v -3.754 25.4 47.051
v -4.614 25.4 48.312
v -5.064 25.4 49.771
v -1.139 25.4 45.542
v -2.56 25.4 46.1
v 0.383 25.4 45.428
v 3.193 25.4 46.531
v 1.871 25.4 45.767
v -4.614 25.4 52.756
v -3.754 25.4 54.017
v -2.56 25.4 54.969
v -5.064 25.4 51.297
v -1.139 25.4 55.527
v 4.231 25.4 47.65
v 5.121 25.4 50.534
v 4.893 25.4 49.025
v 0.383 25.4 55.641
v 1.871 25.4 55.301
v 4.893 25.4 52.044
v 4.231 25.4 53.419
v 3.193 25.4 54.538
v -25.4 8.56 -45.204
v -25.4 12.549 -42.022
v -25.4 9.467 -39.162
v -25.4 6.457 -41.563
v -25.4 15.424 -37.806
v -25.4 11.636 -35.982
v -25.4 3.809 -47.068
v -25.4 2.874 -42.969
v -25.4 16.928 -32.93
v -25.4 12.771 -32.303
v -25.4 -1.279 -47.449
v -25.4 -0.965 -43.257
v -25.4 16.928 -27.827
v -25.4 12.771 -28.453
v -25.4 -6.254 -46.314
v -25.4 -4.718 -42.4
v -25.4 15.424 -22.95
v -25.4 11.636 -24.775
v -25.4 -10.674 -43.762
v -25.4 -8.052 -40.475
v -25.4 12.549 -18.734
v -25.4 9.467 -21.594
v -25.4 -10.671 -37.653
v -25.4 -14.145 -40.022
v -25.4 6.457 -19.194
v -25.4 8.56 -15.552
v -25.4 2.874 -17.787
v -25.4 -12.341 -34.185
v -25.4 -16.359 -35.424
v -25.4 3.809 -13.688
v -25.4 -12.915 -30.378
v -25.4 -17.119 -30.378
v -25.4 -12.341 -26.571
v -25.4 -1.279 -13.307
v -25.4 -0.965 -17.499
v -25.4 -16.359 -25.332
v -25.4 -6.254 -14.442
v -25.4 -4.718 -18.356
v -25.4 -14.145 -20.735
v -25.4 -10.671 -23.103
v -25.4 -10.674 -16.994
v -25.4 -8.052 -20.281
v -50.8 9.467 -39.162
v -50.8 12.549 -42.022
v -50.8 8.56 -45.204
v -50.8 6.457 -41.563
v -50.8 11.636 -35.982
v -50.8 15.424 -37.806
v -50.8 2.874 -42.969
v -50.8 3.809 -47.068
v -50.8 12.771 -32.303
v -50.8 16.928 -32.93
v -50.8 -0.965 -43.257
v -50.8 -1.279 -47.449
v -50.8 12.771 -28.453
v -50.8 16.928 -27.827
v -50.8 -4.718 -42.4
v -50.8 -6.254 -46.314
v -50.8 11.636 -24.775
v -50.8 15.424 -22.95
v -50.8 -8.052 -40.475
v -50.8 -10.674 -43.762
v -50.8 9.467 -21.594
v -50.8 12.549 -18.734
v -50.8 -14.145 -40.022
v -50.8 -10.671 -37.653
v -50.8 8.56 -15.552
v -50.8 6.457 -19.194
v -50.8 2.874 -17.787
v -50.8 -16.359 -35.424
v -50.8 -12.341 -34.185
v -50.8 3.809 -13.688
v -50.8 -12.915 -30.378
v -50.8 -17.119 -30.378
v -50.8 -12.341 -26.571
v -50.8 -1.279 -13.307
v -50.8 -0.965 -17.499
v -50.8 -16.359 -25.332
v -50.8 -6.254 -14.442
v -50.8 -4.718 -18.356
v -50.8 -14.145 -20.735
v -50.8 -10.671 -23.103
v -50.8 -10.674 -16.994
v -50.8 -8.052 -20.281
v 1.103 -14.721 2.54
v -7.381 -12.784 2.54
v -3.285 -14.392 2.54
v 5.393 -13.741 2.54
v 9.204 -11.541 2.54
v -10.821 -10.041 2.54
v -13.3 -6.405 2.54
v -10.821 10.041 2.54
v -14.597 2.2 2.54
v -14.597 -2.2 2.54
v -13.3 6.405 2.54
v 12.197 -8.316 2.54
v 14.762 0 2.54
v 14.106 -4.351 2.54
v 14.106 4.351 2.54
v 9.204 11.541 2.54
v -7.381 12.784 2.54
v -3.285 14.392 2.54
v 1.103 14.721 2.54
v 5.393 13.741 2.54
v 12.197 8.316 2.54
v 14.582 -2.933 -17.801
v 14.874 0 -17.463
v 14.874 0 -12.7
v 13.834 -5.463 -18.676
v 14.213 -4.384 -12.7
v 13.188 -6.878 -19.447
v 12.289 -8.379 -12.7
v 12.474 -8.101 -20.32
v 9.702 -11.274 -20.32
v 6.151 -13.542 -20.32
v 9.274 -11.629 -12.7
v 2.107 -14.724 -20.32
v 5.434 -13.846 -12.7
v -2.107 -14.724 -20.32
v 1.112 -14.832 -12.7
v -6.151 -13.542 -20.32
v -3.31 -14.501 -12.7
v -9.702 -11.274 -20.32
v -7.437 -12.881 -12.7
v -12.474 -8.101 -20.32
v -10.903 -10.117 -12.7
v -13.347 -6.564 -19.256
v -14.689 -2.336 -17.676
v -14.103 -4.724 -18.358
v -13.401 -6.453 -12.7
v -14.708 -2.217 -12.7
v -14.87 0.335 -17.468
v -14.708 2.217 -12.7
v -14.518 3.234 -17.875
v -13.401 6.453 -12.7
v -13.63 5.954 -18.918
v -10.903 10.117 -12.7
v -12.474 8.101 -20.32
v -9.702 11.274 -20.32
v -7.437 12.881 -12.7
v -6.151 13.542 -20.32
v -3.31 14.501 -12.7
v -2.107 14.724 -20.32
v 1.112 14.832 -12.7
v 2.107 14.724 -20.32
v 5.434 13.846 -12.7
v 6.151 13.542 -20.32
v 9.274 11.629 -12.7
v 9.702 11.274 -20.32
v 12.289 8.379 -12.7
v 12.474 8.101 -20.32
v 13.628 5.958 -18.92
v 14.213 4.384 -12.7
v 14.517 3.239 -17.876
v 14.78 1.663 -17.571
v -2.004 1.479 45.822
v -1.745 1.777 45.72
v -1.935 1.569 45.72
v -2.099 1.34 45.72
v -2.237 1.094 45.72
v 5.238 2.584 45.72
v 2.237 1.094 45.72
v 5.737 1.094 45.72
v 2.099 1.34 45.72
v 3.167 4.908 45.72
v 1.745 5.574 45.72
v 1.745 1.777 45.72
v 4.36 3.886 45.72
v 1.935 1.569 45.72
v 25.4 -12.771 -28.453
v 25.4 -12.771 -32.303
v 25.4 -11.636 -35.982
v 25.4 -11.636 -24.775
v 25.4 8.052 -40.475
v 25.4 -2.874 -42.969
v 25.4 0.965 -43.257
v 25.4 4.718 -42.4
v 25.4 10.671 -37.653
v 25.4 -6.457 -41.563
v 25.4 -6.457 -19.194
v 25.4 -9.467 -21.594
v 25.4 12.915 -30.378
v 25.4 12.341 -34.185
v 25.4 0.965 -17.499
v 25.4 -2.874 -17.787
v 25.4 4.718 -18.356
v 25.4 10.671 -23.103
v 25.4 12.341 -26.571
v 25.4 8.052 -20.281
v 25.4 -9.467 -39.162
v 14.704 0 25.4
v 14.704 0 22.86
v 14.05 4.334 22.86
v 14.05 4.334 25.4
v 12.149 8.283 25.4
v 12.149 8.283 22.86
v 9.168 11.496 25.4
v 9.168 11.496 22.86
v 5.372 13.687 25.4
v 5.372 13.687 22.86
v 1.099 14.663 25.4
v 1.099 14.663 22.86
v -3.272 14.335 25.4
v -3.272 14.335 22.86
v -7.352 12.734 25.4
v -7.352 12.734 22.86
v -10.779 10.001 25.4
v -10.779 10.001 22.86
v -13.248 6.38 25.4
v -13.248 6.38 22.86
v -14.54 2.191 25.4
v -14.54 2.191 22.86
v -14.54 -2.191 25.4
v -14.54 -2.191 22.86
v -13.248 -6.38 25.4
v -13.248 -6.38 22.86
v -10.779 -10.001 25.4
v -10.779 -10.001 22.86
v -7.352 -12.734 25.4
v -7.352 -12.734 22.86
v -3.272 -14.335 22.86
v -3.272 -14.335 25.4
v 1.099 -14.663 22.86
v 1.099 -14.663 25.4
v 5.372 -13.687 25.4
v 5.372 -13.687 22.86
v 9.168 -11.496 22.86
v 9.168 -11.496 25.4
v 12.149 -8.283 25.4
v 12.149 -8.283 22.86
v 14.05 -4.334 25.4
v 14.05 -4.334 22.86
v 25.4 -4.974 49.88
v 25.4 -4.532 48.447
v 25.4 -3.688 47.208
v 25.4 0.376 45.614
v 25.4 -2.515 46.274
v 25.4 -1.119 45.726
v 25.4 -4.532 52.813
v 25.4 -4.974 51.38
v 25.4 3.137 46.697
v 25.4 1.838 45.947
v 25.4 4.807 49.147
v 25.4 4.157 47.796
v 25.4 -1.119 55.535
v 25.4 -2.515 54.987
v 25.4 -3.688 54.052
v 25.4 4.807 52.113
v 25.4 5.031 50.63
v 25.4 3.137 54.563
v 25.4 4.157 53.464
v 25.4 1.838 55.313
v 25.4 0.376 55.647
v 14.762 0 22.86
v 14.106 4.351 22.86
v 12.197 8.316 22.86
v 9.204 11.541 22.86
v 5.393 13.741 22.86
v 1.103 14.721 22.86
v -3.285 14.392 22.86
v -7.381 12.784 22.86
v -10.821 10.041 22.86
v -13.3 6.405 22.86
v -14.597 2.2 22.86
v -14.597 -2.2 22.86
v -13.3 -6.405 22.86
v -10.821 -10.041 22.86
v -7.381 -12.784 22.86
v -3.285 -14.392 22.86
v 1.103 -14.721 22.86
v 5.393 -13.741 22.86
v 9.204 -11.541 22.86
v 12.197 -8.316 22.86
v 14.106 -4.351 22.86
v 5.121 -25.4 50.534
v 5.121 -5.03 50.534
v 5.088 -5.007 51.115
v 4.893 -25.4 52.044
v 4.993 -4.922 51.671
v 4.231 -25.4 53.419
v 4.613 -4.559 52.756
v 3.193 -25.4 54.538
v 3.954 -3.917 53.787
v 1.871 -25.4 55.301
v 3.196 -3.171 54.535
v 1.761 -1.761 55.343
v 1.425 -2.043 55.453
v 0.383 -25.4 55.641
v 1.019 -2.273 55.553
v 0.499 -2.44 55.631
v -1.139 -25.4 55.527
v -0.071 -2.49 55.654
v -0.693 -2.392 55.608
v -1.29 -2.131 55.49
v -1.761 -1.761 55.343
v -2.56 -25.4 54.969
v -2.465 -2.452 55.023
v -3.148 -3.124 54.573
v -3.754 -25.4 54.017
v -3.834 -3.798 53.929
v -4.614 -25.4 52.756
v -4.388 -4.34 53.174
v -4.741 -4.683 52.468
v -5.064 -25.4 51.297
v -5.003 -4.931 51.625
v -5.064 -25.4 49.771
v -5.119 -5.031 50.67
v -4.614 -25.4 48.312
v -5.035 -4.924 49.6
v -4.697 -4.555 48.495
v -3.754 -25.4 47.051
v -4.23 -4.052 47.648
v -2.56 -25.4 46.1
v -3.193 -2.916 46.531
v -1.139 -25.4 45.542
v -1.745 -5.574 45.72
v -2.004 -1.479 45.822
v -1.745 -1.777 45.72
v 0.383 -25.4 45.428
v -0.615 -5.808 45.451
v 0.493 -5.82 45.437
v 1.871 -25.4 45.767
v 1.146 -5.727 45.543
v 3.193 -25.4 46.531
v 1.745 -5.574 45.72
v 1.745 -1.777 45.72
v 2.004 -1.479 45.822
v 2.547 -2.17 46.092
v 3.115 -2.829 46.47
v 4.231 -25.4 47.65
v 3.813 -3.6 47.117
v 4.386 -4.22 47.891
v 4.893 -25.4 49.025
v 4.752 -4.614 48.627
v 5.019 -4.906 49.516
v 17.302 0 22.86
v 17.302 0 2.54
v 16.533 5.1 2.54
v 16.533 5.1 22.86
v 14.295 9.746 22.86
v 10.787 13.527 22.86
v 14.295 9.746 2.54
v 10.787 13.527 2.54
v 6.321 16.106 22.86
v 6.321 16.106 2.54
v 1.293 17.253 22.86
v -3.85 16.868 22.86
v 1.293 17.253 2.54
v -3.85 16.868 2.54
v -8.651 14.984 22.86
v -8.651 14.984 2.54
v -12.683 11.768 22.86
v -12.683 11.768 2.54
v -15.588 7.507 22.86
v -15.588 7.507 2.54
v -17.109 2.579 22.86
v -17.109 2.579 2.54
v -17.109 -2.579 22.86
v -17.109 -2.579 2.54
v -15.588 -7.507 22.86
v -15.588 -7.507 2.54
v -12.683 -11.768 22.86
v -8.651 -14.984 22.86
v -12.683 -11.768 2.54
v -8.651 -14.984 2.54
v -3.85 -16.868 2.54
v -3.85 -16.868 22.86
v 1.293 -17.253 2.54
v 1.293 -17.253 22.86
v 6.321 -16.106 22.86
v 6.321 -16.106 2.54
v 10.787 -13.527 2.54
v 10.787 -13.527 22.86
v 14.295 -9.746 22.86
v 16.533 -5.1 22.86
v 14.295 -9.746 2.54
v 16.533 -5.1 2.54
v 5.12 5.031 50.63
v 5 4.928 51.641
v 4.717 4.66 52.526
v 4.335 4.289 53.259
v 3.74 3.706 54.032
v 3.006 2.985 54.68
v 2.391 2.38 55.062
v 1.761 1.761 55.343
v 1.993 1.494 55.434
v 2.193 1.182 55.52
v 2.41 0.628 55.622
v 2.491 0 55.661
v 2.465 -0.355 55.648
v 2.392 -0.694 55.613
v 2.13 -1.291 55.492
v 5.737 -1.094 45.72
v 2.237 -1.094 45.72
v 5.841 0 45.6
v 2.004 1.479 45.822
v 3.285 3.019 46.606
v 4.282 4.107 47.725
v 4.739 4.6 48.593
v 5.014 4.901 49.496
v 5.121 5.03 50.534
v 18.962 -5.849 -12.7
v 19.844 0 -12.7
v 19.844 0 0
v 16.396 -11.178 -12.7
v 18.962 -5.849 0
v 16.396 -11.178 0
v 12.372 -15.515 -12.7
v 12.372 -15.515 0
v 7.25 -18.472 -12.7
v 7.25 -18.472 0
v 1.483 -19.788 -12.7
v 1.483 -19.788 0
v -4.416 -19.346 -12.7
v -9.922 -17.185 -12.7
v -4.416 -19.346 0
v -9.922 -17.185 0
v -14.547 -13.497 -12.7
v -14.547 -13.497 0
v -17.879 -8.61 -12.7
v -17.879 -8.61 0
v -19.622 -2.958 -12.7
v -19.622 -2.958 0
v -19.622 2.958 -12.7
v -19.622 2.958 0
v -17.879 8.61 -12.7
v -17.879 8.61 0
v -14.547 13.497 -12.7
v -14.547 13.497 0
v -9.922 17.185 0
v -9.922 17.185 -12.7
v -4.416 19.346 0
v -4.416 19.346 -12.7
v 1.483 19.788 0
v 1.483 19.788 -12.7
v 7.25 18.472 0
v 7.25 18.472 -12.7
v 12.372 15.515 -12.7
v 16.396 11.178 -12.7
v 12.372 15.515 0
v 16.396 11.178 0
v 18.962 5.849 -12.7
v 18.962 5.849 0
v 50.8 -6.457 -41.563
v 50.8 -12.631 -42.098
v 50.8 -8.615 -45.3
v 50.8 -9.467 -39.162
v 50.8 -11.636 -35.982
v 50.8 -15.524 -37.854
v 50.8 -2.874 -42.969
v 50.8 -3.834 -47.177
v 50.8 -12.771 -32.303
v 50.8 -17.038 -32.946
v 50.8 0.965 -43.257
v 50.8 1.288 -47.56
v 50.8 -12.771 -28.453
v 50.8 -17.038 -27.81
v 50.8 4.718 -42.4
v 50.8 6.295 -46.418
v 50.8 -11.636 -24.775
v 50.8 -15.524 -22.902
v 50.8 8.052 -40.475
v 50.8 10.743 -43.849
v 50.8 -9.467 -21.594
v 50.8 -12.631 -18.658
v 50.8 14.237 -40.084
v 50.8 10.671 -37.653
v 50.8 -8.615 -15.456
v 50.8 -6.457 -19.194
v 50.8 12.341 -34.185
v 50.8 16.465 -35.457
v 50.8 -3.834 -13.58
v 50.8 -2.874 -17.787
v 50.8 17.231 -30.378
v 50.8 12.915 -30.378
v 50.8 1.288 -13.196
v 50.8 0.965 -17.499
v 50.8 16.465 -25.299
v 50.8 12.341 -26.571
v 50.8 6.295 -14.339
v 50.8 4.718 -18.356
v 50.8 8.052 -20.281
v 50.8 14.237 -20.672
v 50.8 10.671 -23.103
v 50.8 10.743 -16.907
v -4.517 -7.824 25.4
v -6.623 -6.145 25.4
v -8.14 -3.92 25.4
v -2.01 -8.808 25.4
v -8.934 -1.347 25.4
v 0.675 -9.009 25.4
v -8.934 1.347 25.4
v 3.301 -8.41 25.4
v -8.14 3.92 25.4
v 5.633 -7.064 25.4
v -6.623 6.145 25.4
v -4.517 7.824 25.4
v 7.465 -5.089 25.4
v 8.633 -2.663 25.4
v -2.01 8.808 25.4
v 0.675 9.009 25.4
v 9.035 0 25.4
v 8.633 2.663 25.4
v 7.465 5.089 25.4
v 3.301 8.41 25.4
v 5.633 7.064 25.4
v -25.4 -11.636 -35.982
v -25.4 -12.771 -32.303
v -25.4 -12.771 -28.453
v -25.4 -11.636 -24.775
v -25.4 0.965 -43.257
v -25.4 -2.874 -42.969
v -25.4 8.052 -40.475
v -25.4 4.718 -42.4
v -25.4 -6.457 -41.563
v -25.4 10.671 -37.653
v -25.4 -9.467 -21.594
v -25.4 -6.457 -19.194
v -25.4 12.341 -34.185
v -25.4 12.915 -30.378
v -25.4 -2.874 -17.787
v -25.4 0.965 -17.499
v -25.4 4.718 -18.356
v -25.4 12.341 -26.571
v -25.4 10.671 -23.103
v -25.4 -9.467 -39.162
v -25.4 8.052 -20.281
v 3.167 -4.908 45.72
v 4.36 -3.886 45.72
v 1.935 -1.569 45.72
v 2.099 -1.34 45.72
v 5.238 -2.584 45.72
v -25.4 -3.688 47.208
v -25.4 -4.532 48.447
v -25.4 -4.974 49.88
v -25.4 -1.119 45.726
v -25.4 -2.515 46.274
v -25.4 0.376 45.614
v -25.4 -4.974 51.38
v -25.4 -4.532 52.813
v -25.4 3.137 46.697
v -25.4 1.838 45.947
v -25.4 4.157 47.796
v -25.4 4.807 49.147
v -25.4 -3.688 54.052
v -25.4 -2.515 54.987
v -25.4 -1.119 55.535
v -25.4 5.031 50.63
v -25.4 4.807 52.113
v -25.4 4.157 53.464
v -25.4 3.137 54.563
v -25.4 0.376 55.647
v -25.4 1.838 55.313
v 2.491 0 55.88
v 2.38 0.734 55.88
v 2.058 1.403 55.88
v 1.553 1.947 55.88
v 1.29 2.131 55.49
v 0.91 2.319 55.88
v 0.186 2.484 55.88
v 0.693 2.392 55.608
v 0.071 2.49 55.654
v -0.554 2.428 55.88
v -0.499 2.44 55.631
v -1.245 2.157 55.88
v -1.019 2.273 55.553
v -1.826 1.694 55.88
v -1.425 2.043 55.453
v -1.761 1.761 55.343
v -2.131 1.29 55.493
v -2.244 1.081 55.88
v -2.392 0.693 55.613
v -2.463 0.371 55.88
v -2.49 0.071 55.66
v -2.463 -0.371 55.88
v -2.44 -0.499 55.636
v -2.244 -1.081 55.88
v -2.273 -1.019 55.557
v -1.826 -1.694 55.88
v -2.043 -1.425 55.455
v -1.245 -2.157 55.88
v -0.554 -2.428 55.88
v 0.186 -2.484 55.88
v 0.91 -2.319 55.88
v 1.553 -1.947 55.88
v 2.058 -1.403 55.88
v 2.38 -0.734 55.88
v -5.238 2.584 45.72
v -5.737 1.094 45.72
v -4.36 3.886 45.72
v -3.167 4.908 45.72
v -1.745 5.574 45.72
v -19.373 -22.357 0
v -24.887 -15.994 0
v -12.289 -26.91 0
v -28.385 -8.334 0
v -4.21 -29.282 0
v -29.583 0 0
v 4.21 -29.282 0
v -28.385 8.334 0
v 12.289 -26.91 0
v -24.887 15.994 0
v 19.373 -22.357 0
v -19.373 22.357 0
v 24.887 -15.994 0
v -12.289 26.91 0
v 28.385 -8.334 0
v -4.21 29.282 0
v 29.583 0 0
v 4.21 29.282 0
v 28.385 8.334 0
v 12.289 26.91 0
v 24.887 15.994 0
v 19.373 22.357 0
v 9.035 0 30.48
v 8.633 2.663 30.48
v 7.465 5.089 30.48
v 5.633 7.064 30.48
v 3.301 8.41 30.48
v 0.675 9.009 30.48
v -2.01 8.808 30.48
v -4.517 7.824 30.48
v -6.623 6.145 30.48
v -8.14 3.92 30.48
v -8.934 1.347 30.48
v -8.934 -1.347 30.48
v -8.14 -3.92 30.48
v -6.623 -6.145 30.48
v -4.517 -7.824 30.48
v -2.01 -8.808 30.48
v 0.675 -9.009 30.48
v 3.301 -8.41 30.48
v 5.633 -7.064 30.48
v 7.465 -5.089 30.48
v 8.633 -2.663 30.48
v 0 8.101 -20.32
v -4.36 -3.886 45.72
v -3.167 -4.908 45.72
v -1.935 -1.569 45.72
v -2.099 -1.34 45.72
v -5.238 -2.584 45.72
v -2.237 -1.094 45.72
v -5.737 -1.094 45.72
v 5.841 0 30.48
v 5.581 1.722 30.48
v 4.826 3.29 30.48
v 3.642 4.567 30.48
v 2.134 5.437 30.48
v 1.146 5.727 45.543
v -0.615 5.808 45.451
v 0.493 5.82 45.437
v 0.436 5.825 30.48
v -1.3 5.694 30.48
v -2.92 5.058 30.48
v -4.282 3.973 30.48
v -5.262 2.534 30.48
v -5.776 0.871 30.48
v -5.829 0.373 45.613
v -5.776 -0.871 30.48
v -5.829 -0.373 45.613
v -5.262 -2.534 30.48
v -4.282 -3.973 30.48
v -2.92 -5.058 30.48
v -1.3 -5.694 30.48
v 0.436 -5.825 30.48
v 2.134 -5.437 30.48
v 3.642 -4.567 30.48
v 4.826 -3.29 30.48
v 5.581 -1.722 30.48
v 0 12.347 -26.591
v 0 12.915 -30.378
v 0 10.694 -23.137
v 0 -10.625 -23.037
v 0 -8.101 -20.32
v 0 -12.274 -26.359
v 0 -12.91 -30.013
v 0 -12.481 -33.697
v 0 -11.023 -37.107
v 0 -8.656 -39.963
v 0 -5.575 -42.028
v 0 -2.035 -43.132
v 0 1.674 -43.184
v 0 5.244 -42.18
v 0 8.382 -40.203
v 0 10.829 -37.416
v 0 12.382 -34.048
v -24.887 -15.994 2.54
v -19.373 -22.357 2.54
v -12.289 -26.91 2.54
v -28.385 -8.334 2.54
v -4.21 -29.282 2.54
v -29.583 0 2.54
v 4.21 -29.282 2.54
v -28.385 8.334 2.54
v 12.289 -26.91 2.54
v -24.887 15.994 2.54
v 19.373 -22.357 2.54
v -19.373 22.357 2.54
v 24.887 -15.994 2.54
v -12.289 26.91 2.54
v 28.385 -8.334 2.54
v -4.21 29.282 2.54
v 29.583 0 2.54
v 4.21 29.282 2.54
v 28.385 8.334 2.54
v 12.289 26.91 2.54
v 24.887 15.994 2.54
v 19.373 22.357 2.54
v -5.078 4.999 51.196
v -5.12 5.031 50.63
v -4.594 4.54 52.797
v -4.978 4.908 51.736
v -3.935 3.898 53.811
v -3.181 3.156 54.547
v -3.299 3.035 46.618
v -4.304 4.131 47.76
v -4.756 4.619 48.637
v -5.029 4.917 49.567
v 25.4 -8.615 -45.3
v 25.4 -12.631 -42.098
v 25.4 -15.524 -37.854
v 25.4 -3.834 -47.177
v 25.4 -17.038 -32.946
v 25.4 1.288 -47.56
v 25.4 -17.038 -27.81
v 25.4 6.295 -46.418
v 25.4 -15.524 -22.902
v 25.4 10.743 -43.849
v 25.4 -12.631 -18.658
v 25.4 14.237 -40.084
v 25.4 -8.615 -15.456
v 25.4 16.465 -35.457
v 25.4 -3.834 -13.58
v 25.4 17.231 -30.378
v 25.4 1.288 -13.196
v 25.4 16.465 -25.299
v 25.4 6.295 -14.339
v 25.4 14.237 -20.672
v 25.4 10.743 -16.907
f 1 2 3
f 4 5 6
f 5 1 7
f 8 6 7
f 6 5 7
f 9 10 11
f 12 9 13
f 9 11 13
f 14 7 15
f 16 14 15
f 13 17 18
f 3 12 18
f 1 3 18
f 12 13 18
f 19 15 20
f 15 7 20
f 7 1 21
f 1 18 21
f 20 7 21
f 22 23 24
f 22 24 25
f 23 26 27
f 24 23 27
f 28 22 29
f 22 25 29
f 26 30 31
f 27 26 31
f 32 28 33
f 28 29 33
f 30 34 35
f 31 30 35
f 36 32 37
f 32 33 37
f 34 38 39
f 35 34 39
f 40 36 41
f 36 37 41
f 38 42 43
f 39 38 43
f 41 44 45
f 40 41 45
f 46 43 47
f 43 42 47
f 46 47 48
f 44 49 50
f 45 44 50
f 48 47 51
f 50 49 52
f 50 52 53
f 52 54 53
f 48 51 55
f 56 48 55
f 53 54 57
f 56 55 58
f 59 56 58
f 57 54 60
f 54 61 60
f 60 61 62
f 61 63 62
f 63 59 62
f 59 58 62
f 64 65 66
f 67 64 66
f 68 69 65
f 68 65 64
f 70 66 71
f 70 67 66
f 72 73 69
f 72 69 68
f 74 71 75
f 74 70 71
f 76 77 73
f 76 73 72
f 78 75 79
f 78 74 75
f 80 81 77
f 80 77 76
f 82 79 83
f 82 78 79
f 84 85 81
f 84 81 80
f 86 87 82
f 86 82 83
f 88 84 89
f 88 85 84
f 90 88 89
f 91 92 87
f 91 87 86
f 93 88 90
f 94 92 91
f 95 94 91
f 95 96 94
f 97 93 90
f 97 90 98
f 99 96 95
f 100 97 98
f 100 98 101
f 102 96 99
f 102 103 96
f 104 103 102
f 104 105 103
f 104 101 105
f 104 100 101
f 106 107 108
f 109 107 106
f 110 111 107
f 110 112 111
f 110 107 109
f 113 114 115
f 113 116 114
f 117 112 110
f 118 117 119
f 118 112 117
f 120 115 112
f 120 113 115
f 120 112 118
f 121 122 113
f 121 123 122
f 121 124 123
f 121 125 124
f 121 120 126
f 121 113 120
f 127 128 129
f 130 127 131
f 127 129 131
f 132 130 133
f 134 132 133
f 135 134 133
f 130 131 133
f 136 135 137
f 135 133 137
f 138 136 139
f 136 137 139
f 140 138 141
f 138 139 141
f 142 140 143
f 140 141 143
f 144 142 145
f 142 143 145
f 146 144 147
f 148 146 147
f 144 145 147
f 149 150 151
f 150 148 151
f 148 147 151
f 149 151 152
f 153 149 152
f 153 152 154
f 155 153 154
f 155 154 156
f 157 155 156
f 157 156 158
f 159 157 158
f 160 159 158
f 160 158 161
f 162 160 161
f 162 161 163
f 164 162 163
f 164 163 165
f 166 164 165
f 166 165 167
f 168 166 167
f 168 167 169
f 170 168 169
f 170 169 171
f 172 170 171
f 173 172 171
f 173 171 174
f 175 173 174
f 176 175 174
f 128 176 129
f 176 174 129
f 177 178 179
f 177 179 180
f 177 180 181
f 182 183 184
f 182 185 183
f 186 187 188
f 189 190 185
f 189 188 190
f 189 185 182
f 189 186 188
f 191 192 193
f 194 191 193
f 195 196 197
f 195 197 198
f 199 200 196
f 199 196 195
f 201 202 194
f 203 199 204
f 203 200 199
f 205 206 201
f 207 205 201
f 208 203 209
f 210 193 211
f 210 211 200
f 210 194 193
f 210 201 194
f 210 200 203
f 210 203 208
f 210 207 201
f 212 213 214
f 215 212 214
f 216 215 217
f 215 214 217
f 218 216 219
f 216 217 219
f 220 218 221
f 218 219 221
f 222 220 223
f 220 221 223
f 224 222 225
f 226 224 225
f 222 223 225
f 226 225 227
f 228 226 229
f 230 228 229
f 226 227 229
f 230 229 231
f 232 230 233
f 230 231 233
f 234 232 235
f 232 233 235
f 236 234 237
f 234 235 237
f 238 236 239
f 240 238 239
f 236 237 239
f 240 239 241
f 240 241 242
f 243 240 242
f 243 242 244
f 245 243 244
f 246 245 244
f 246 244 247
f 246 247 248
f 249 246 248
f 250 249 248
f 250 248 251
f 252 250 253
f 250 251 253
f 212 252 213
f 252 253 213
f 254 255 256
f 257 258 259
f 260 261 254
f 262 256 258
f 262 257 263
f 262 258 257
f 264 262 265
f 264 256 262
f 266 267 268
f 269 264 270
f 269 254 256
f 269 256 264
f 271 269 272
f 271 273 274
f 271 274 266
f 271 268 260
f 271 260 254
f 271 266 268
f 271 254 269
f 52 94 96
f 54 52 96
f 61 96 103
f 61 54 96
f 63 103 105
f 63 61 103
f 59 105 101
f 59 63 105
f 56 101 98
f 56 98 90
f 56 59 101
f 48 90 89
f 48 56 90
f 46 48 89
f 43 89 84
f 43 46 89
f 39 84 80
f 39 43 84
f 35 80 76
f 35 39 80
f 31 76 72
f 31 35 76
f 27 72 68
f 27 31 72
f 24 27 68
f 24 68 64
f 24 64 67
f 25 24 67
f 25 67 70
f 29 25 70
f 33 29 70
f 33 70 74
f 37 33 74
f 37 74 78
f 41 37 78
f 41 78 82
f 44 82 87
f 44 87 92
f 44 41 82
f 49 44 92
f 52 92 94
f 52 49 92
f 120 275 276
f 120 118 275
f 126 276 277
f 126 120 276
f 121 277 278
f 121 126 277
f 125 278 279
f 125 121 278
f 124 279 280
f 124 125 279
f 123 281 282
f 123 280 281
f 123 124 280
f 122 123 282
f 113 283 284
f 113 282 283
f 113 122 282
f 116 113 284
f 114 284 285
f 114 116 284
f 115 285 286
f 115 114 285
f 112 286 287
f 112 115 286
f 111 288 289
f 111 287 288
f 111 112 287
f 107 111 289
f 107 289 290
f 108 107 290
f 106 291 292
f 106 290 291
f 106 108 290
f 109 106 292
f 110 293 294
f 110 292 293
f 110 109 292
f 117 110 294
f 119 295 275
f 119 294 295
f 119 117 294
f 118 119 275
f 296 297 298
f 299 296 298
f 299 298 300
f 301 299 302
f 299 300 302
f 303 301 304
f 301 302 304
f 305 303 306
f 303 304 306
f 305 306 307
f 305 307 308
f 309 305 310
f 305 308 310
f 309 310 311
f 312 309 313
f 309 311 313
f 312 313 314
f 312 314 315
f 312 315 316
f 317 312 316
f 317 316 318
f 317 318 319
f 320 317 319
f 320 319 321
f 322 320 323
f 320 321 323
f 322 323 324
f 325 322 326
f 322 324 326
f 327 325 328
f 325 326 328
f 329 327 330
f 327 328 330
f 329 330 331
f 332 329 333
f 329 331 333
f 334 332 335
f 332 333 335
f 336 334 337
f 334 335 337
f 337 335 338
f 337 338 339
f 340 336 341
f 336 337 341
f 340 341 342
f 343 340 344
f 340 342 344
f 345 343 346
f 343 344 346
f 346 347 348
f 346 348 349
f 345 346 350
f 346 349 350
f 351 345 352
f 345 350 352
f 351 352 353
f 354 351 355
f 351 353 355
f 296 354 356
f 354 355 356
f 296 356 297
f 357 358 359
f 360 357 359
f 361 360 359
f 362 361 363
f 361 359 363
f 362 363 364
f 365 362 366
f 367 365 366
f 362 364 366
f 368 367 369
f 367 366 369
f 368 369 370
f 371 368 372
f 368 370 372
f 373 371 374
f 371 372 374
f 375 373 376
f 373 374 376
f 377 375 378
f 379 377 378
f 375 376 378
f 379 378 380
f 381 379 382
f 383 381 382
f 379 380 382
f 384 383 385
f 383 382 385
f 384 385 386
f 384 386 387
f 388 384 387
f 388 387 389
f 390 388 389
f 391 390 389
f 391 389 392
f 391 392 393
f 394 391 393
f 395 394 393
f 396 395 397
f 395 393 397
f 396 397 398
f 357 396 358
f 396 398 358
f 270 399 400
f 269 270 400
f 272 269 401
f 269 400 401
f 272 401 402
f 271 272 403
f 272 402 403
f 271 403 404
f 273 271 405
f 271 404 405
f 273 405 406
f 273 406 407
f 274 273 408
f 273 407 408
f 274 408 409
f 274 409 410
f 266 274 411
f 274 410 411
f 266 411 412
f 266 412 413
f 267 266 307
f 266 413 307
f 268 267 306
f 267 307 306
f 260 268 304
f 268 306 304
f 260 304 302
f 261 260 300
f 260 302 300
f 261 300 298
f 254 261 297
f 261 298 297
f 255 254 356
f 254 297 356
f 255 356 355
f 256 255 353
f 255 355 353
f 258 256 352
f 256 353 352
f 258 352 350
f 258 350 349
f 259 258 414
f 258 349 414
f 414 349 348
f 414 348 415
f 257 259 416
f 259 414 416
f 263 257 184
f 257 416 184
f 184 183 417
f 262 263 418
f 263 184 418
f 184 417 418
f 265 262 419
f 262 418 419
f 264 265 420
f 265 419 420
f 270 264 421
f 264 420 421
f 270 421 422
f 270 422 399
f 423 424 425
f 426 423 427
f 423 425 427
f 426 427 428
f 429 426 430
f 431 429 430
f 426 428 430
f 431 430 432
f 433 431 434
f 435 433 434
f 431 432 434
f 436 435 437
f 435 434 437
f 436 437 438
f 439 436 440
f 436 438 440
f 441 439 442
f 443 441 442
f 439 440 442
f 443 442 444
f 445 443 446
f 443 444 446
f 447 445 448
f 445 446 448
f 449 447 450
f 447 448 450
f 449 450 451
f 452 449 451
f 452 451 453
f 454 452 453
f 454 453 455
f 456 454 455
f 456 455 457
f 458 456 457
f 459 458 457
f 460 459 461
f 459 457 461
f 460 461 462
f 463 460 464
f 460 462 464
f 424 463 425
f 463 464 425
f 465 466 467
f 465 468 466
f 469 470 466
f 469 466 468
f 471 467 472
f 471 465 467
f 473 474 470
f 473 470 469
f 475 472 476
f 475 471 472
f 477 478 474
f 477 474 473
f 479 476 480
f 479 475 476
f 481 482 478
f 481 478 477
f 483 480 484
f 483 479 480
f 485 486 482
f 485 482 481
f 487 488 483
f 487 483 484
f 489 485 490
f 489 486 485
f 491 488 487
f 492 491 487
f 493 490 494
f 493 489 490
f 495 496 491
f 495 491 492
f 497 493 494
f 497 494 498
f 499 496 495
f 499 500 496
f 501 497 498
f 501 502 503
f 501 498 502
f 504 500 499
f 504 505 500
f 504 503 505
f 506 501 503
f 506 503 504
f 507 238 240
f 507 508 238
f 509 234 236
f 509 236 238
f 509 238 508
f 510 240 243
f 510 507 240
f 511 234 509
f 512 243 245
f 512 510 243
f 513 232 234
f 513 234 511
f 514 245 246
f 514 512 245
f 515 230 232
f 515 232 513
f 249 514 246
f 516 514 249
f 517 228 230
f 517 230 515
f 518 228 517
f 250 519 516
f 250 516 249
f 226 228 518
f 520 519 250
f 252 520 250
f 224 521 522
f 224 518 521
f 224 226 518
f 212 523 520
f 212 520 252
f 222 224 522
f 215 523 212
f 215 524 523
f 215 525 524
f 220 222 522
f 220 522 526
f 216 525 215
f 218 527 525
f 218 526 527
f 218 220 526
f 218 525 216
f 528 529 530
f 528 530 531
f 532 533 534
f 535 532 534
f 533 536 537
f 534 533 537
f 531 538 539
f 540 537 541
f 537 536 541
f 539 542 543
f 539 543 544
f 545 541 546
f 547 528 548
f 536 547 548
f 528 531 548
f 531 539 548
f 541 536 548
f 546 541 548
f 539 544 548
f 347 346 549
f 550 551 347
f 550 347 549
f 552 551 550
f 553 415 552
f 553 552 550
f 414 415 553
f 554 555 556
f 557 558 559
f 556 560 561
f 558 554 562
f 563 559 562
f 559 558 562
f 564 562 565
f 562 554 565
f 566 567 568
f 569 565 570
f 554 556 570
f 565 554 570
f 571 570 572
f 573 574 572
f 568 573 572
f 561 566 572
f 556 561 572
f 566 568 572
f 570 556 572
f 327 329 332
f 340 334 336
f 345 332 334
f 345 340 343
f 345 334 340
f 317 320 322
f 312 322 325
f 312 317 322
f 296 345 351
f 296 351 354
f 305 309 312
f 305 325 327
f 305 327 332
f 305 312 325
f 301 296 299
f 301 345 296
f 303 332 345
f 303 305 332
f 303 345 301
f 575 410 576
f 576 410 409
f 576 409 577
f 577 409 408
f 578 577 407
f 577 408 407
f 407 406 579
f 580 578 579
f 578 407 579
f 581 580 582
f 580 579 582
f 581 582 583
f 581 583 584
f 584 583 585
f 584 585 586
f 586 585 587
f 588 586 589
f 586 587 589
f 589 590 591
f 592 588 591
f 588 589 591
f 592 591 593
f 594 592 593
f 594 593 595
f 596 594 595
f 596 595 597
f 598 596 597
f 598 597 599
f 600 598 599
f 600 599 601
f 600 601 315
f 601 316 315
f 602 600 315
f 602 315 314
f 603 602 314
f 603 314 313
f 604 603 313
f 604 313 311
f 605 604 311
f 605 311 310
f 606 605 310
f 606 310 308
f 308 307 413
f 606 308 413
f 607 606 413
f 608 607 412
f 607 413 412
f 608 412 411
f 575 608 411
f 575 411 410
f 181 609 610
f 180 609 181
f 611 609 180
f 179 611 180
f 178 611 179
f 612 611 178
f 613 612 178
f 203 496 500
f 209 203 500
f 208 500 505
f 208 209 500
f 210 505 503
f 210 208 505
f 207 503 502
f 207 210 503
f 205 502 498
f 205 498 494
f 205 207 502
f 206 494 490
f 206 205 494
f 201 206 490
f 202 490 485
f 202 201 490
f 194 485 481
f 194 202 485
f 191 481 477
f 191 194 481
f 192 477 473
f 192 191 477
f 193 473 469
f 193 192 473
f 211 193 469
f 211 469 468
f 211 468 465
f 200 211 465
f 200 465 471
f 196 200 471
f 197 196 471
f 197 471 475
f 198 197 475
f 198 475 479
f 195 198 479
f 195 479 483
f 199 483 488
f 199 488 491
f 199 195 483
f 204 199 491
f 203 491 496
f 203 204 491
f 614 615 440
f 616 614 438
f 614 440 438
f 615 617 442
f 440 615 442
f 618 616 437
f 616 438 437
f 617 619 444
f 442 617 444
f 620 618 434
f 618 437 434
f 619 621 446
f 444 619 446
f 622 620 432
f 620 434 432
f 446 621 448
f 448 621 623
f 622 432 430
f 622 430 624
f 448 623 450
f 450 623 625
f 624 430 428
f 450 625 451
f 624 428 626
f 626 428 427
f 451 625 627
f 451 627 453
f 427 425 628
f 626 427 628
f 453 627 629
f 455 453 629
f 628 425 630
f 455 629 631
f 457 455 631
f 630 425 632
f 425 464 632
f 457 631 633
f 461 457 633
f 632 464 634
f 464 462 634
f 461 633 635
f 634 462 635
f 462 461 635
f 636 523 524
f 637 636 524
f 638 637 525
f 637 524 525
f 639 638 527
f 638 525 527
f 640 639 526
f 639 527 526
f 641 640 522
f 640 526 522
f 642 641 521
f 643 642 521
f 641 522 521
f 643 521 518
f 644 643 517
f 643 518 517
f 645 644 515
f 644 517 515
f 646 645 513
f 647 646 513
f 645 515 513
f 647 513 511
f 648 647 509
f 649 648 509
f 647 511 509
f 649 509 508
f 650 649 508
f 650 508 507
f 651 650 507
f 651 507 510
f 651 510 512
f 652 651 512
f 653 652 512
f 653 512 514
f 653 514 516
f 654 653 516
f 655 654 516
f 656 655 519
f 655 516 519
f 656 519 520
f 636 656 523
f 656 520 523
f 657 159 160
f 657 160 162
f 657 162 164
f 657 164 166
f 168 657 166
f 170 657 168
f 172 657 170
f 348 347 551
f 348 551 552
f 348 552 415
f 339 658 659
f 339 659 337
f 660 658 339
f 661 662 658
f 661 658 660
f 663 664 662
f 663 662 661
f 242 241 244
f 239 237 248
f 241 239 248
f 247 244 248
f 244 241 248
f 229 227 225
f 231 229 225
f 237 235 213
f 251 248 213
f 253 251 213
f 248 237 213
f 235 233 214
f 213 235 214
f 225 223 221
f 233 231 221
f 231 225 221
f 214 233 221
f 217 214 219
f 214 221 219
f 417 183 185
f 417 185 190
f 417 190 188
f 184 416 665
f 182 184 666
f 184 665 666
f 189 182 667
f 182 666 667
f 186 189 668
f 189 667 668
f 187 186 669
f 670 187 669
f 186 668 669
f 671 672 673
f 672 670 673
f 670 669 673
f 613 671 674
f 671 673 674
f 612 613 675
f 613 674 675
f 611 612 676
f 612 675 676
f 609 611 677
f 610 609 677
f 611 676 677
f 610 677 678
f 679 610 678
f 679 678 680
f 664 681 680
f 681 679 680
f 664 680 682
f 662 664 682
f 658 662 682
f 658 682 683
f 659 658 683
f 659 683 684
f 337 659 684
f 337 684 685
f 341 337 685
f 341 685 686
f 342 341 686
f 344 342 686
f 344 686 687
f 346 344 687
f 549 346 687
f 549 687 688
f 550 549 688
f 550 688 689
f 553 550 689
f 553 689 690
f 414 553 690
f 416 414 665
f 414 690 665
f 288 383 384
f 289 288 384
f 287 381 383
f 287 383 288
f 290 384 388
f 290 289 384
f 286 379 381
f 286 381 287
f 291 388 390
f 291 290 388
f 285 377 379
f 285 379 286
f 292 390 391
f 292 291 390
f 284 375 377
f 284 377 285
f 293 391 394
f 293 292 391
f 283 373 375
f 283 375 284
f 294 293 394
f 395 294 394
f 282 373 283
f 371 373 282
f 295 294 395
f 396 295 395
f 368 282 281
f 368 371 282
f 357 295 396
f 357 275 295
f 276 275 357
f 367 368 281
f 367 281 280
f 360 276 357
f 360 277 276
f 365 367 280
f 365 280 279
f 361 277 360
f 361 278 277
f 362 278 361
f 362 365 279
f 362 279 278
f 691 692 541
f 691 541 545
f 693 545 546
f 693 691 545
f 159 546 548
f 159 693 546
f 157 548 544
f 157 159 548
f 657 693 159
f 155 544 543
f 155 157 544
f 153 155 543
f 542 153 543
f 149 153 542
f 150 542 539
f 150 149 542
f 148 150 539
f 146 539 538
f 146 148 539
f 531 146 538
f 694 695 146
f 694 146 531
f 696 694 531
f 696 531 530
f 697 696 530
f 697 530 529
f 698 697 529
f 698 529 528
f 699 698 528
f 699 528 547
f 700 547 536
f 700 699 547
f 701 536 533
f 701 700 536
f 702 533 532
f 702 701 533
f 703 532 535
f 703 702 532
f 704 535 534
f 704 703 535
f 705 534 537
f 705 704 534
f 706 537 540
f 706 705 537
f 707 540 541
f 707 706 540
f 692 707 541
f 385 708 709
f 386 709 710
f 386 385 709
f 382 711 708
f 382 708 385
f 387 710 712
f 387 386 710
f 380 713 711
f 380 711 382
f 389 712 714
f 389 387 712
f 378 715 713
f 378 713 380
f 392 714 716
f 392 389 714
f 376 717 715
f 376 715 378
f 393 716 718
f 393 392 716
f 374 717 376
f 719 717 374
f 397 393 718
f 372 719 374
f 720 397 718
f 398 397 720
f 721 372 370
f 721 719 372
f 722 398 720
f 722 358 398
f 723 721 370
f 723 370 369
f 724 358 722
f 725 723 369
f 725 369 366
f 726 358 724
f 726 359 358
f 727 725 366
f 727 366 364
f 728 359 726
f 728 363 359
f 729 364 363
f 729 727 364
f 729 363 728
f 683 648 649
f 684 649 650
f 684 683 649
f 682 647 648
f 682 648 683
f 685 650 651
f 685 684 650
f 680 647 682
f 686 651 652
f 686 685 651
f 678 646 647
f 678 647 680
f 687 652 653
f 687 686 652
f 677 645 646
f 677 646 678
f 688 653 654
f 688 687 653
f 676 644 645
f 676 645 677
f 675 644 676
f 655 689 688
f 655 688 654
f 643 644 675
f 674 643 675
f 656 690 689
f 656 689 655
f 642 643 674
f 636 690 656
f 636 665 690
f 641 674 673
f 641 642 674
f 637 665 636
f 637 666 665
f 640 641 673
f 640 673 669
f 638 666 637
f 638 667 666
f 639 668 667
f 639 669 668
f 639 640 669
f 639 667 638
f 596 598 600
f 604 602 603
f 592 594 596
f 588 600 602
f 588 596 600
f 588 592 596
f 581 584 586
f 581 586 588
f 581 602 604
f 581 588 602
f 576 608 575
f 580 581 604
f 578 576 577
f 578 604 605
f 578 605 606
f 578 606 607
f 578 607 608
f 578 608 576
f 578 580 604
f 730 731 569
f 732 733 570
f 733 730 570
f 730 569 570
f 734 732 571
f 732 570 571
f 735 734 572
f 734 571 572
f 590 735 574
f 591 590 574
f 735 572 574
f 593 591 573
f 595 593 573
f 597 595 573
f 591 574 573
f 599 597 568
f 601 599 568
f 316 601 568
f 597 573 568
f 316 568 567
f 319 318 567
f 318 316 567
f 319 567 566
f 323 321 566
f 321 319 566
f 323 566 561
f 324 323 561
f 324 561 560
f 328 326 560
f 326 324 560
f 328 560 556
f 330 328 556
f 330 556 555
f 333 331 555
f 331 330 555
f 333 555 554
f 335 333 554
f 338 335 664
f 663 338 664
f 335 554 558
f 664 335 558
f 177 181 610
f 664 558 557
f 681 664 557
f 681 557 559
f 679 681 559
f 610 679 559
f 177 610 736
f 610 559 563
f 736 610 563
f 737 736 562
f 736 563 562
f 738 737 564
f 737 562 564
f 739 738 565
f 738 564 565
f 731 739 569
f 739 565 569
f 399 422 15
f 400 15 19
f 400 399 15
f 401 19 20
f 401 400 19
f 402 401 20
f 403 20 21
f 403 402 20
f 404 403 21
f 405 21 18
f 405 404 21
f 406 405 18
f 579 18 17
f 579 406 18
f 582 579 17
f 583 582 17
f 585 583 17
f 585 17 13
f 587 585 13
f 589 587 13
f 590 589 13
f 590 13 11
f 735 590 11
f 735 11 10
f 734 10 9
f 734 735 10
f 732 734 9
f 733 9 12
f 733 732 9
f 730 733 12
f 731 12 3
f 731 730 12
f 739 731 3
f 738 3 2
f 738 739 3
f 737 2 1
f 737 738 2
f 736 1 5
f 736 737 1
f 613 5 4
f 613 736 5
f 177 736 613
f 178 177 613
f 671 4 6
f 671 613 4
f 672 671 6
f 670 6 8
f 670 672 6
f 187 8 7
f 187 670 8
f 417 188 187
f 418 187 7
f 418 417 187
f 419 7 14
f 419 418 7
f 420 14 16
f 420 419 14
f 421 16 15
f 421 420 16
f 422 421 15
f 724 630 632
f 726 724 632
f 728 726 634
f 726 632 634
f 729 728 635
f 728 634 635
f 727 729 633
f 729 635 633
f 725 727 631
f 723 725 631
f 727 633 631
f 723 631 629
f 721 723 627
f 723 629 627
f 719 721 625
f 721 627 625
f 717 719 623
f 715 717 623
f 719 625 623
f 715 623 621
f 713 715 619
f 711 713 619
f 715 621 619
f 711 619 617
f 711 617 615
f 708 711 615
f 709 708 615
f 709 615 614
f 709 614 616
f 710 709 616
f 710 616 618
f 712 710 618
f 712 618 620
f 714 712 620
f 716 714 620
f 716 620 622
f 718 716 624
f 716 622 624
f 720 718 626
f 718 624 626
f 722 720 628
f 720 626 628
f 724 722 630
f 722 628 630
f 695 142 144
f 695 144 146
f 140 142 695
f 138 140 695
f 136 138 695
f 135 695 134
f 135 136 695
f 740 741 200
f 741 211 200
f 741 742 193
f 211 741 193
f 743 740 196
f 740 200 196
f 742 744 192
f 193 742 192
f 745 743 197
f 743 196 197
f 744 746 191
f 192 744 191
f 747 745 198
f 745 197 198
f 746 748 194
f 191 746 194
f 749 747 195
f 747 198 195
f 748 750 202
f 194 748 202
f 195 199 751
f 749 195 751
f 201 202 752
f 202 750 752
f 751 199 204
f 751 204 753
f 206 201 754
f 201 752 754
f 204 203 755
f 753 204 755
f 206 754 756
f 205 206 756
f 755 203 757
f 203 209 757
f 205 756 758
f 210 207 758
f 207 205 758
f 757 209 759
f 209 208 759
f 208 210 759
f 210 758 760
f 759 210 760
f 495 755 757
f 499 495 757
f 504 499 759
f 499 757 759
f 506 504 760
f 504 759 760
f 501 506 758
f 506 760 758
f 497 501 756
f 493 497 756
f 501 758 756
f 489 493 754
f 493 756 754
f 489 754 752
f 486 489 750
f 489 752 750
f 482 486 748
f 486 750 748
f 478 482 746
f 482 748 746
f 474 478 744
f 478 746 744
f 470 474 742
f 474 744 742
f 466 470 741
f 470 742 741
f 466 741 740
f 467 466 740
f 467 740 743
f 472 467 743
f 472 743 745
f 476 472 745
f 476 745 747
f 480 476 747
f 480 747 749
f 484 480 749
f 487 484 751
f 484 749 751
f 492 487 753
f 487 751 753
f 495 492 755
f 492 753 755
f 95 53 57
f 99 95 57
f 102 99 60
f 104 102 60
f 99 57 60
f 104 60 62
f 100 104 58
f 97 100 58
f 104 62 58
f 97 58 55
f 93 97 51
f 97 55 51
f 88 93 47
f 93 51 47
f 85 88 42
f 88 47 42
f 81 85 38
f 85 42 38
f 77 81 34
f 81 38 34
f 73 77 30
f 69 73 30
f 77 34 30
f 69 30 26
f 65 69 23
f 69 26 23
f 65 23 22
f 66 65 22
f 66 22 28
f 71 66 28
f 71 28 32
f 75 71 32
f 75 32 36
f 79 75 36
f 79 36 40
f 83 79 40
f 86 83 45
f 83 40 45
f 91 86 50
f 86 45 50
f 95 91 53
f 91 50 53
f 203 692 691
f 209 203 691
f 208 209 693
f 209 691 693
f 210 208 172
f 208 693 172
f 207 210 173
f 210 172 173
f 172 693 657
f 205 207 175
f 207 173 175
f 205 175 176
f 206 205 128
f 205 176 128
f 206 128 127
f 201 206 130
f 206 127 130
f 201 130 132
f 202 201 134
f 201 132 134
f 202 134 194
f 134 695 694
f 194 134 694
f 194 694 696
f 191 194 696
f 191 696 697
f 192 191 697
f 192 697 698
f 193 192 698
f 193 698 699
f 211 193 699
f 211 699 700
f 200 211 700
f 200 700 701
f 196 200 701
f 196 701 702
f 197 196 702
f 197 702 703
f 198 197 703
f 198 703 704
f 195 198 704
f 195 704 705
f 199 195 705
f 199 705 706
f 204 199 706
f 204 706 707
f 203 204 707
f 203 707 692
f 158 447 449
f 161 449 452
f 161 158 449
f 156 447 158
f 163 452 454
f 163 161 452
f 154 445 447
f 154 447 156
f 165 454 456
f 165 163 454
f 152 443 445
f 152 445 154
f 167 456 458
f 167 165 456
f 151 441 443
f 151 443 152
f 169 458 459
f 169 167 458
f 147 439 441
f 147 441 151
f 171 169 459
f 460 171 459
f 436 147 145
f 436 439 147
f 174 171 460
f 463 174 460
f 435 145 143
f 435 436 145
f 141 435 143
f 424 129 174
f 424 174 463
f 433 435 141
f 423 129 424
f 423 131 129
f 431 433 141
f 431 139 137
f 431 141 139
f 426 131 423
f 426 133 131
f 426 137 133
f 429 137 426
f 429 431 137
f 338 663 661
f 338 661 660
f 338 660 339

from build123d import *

# Parameters (mm, degrees)
F0_R           = 29.5829734146
F1_DEPTH       = 2.54
F2_R           = 17.3017917946
F3_DEPTH       = 20.32
F4_T           = -2.54
F5_R           = 14.7037348568
F6_DEPTH       = 2.54
F7_R           = 9.0347468528
F8_DEPTH       = 5.08
F9_R           = 5.8408968213
F10_DEPTH      = 15.24
F11_R          = 2.4907592274
F12_DEPTH      = 10.16
F13_R          = 5.0306840155
F14_DEPTH      = 25.4
F14_DEPTH_BACK = 25.4
F15_R          = 5.1207105193
F16_DEPTH      = 25.4
F16_DEPTH_BACK = 25.4
F17_R          = 19.8438709688
F18_DEPTH      = 12.7
F19_R          = 14.8736691487
F20_DEPTH      = 7.62
F21_R          = 12.914817916
F22_DEPTH      = 25.4
F22_DEPTH_BACK = 25.4
F23_R          = 17.1191917215
F23_R_2        = 12.914817916
F24_DEPTH      = 25.4
F25_R          = 17.2305196111
F25_R_2        = 12.914817916
F26_DEPTH      = 25.4


with BuildPart() as f1:
    # F0 (on Top) → F1 (new body)
    with BuildSketch(Plane.XY):
        Circle(F0_R)
    extrude(amount=F1_DEPTH)

    # F2 (on face) → F3 (join)
    with BuildSketch(Plane.XY.offset(2.54)):
        Circle(F2_R)
    extrude(amount=F3_DEPTH)

    # F4
    f4_openings = [f1.faces().sort_by_distance(p)[0] for p in [
        (0, 0, 22.86),
    ]]
    offset(amount=F4_T, openings=f4_openings, kind=Kind.INTERSECTION)

    # F17 (on face) → F18 (join)
    with BuildSketch(Plane(origin=(0, 0, 0), x_dir=(1, 0, 0), z_dir=(0, 0, -1))):
        Circle(F17_R)
    extrude(amount=F18_DEPTH)

    # F19 (on face) → F20 (join)
    with BuildSketch(Plane(origin=(0, 0, -12.7), x_dir=(1, 0, 0), z_dir=(0, 0, -1))):
        Circle(F19_R)
    extrude(amount=F20_DEPTH)

    # F21 (on Right) → F22 (join, two sides)
    with BuildSketch(Plane.YZ) as f22_sk:
        with Locations((0, -30.3781293333)):
            Circle(F21_R)
    extrude(amount=F22_DEPTH)
    extrude(f22_sk.sketch, amount=-F22_DEPTH_BACK)


with BuildPart() as f6:
    # F5 (on face) → F6 (new body)
    with BuildSketch(Plane.XY.offset(22.86)):
        Circle(F5_R)
    extrude(amount=F6_DEPTH)

    # F7 (on face) → F8 (join)
    with BuildSketch(Plane.XY.offset(25.4)):
        Circle(F7_R)
    extrude(amount=F8_DEPTH)

    # F9 (on face) → F10 (join)
    with BuildSketch(Plane.XY.offset(30.48)):
        Circle(F9_R)
    extrude(amount=F10_DEPTH)

    # F11 (on face) → F12 (join)
    with BuildSketch(Plane.XY.offset(45.72)):
        Circle(F11_R)
    extrude(amount=F12_DEPTH)

    # F13 (on Right) → F14 (join, two sides)
    with BuildSketch(Plane.YZ) as f14_sk:
        with Locations((0, 50.6302118301)):
            Circle(F13_R)
    extrude(amount=F14_DEPTH)
    extrude(f14_sk.sketch, amount=-F14_DEPTH_BACK)

    # F15 (on Front) → F16 (join, two sides)
    with BuildSketch(Plane.XZ) as f16_sk:
        with Locations((0, 50.5342297256)):
            Circle(F15_R)
    extrude(amount=F16_DEPTH)
    extrude(f16_sk.sketch, amount=-F16_DEPTH_BACK)


with BuildPart() as f24:
    # F23 (on face) → F24 (new body)
    with BuildSketch(Plane(origin=(-25.4, 0, 0), x_dir=(0, -1, 0), z_dir=(-1, 0, 0))):
        with Locations((0, -30.3781293333)):
            Circle(F23_R)
        with Locations((0, -30.3781293333)):
            Circle(F23_R_2, mode=Mode.SUBTRACT)
    extrude(amount=F24_DEPTH)


with BuildPart() as f26:
    # F25 (on face) → F26 (new body)
    with BuildSketch(Plane.YZ.offset(25.4)):
        with Locations((0, -30.3781293333)):
            Circle(F25_R)
        with Locations((0, -30.3781293333)):
            Circle(F25_R_2, mode=Mode.SUBTRACT)
    extrude(amount=F26_DEPTH)


solid = Compound([f1.part, f6.part, f24.part, f26.part])
